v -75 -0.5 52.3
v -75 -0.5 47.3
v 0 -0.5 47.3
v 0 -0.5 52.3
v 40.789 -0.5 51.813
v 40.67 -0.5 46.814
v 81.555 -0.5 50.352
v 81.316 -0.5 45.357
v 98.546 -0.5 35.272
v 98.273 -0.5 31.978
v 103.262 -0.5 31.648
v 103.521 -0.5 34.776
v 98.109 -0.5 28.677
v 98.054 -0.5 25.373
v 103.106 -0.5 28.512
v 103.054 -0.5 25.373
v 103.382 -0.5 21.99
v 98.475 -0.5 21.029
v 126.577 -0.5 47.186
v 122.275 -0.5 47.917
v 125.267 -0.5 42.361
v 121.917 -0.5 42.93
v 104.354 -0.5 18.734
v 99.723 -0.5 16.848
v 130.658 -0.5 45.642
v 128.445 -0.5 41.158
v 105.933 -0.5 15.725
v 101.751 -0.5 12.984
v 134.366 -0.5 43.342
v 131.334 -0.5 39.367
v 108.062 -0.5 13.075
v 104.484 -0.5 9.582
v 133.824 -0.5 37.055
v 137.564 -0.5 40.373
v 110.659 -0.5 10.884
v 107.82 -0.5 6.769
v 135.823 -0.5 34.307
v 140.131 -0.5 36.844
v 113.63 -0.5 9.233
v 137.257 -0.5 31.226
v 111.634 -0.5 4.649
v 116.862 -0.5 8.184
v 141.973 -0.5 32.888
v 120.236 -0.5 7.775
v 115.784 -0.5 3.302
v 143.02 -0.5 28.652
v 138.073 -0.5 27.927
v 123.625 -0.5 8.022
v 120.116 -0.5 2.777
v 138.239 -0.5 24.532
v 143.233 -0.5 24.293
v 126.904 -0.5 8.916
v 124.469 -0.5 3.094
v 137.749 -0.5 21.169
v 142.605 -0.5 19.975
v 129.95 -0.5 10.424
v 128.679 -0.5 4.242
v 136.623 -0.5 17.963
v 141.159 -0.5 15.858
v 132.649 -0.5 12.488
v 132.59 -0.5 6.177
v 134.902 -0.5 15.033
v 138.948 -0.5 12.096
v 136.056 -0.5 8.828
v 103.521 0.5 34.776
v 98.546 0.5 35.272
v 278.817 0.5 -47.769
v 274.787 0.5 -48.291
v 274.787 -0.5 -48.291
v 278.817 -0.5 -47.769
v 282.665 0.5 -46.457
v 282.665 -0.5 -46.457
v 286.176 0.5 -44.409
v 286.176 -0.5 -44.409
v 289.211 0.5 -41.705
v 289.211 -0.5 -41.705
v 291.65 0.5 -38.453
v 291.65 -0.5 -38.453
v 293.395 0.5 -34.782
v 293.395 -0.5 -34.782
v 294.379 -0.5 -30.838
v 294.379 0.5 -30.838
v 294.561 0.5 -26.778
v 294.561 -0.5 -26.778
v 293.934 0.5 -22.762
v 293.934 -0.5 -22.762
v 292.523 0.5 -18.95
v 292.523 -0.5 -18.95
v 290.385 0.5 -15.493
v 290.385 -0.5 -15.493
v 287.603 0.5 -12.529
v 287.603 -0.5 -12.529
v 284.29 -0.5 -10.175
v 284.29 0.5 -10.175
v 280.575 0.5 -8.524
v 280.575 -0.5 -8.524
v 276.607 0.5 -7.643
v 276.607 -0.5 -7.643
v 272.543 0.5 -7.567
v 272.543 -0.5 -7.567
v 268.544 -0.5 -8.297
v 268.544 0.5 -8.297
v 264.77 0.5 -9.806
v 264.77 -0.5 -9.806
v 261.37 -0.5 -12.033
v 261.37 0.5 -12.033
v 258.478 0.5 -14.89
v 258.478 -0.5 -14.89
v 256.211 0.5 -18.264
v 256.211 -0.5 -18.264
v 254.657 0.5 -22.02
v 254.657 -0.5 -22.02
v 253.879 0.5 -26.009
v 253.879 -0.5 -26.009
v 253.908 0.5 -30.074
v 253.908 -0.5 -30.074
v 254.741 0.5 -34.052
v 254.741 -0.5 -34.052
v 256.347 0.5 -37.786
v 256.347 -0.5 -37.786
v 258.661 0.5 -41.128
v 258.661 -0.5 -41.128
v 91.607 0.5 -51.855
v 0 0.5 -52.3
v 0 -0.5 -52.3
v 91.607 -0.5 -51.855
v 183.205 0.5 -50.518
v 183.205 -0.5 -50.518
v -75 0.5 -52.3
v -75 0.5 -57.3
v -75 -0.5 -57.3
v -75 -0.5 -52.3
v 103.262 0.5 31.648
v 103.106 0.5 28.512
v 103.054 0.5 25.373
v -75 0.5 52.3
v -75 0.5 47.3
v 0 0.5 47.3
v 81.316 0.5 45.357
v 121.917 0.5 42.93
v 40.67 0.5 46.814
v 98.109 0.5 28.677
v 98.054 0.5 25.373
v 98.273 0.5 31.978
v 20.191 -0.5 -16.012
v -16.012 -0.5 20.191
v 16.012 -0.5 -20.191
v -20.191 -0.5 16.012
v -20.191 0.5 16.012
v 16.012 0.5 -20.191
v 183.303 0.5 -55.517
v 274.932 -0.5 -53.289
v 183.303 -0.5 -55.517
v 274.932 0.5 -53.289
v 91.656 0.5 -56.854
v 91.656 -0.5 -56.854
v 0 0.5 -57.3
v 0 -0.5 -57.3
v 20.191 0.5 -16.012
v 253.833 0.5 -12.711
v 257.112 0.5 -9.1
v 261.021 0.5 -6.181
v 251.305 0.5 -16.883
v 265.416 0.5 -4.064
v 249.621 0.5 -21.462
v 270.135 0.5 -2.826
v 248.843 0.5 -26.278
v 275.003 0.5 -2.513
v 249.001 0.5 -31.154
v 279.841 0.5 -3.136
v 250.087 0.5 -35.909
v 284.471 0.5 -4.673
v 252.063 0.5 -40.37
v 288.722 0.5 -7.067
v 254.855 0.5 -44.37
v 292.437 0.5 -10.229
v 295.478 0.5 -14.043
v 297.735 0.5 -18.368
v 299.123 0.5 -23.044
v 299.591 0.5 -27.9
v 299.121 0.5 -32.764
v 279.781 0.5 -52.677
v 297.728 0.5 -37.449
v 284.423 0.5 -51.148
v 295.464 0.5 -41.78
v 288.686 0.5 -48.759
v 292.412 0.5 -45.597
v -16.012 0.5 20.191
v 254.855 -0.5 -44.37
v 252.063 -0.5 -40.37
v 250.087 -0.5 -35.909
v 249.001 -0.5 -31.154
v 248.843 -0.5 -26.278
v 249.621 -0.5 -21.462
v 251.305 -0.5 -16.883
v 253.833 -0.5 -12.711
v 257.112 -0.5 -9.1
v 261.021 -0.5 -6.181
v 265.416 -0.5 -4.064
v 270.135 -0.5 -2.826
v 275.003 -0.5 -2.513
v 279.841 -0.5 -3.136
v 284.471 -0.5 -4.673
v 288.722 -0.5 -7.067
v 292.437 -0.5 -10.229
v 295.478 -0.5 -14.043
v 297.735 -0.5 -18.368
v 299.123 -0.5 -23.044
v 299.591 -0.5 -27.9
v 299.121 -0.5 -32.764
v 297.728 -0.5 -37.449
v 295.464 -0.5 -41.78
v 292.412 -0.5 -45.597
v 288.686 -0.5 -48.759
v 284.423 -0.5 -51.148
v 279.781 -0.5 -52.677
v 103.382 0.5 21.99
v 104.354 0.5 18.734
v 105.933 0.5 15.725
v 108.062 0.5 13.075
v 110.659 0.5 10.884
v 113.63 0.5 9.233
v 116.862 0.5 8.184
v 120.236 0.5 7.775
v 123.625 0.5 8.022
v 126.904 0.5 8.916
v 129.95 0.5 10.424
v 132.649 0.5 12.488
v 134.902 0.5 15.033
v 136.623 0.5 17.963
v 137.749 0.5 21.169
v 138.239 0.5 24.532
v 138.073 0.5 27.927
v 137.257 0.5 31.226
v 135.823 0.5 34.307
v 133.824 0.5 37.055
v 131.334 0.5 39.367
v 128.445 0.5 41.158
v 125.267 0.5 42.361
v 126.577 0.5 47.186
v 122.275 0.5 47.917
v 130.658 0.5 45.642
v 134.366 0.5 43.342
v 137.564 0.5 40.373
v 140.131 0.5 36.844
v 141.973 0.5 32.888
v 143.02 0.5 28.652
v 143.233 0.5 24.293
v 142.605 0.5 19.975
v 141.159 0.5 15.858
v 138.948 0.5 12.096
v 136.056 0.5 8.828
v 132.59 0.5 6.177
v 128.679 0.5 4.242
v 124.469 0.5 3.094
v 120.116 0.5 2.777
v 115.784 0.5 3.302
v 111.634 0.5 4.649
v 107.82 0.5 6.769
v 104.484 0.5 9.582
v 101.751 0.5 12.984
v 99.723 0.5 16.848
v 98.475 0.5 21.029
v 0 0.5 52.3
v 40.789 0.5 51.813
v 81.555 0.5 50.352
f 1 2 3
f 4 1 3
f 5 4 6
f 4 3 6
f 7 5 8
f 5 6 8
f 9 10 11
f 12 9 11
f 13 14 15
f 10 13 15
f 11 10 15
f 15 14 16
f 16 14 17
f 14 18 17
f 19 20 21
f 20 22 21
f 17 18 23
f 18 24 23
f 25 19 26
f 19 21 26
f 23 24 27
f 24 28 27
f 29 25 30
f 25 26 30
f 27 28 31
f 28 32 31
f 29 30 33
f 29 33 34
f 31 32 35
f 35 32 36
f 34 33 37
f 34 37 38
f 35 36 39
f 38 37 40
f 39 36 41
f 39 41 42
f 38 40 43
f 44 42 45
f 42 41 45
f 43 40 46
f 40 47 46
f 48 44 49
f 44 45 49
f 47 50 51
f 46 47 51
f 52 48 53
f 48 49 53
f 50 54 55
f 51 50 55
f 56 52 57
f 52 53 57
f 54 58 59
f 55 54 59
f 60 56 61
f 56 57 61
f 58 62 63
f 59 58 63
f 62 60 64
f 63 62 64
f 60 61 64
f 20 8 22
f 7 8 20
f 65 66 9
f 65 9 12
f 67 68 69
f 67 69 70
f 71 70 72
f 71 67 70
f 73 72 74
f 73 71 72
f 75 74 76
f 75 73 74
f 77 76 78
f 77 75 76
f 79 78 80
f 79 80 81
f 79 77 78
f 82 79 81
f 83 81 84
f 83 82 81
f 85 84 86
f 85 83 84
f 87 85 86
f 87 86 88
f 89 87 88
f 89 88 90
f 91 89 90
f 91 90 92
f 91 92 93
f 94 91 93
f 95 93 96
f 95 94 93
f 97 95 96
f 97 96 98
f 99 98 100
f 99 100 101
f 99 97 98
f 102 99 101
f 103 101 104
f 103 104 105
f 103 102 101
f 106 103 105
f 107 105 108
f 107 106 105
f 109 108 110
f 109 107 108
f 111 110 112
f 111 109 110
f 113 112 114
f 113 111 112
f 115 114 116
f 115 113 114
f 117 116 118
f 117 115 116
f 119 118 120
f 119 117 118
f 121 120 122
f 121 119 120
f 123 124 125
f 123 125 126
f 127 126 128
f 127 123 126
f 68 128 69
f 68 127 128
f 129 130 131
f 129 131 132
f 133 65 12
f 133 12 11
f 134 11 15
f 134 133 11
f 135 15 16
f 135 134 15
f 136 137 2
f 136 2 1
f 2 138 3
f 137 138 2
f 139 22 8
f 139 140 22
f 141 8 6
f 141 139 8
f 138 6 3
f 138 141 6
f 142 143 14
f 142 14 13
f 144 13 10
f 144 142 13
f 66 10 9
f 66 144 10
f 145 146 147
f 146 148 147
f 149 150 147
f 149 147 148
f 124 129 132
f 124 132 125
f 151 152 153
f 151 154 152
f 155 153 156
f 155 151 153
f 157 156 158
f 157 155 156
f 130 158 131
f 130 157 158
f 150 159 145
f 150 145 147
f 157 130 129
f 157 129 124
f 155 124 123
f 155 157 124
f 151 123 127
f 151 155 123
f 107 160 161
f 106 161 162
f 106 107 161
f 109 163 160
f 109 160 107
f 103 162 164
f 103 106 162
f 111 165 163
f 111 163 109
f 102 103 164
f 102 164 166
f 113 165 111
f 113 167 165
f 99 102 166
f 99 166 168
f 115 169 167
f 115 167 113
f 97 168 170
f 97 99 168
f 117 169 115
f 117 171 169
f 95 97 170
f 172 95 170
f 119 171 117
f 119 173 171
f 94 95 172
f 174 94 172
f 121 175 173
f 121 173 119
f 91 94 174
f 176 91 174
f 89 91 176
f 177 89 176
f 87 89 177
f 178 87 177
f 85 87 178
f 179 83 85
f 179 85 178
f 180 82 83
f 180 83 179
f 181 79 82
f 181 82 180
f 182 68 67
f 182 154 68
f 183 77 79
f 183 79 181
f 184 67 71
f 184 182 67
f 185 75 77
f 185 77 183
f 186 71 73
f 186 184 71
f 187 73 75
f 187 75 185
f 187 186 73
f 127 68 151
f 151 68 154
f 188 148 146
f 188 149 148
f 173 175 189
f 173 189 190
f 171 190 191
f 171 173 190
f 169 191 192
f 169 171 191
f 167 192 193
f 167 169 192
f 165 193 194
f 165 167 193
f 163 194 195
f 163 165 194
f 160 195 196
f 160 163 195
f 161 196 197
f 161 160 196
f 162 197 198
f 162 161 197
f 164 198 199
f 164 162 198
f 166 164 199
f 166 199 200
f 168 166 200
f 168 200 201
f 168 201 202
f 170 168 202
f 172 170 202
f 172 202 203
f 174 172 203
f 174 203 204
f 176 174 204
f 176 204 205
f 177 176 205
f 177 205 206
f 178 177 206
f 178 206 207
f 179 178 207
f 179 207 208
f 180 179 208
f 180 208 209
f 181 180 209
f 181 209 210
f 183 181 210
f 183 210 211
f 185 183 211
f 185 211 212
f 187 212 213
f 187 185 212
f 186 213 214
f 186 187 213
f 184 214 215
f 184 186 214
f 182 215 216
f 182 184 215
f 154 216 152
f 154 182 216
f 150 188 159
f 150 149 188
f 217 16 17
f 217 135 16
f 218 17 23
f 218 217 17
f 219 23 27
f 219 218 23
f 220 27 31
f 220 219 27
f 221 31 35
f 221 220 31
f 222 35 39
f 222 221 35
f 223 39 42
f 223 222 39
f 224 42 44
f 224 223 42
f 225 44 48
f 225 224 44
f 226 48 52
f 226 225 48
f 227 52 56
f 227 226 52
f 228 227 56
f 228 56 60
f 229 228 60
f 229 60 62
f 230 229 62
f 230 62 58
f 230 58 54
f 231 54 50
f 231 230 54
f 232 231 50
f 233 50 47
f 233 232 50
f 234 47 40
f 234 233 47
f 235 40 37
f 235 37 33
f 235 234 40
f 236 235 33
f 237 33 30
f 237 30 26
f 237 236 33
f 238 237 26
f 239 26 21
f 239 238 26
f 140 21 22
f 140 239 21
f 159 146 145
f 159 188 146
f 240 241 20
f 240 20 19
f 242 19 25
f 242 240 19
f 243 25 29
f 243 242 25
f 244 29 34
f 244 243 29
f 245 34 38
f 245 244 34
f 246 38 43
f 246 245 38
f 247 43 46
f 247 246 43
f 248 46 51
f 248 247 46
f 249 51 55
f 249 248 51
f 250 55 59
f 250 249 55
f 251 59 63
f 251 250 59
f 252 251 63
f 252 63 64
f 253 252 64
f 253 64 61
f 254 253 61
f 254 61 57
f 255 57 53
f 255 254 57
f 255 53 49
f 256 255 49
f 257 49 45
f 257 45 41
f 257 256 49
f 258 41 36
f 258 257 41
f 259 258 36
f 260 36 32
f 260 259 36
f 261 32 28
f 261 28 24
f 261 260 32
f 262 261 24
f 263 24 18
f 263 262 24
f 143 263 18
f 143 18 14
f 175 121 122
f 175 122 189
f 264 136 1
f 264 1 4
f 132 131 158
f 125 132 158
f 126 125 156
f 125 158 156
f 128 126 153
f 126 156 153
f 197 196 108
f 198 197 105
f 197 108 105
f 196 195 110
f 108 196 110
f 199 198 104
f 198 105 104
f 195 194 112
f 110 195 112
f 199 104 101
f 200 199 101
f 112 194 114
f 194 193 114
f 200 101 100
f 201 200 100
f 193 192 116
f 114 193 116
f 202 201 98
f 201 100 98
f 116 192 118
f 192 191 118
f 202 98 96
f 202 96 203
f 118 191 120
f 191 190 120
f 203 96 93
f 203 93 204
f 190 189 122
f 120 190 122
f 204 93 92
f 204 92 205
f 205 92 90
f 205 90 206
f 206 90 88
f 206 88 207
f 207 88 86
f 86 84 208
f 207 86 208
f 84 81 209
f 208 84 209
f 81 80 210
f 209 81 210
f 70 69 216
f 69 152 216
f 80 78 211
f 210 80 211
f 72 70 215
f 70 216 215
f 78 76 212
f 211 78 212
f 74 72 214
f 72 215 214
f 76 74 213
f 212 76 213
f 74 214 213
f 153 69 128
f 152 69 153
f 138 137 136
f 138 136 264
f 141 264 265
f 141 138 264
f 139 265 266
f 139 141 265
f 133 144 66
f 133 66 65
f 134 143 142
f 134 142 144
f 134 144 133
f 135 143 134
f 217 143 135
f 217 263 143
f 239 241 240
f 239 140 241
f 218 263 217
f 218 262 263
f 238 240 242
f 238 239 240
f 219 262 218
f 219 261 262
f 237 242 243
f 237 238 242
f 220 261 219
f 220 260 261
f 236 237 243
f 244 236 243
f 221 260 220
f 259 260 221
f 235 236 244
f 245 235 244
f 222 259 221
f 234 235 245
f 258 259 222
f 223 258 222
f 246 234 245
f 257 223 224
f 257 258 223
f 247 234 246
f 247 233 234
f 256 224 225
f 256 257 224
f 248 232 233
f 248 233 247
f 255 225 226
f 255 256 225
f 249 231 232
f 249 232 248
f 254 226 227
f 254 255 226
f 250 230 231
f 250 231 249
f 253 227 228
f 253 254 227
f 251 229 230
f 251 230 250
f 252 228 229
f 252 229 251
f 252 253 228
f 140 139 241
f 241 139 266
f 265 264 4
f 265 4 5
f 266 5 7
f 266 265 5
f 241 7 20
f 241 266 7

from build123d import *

# Parameters (mm, degrees)
BOSS_EXTRUDE1_DEPTH   = 0.5
BOSS_EXTRUDE1_2_DEPTH = 0.5
BOSS_EXTRUDE1_3_DEPTH = 0.5


with BuildPart() as part:
    # Sketch1 → Boss-Extrude1 (new, symmetric)
    with BuildSketch(Plane(origin=(0, 0, 0), x_dir=(1, 0, 0), z_dir=(0, 1, 0))):
        with BuildLine():
            Line((0, 57.3), (-75, 57.3))
            Line((-75, 57.3), (-75, 52.3))
            Line((-75, 52.3), (0, 52.3))
            ThreePointArc((0, 52.3), (137.407875272, 51.297776384), (274.786512082, 48.291318796))
            ThreePointArc((274.786512082, 48.291318796), (288.825291969, 42.113029408), (294.591434137, 27.9))
            ThreePointArc((294.591434137, 27.9), (267.143524545, 8.756150586), (258.661339001, 41.127854893))
            Line((258.661339001, 41.127854893), (254.854943134, 44.36997619))
            ThreePointArc((254.854943134, 44.36997619), (265.416095723, 4.064030632), (299.591434137, 27.9))
            ThreePointArc((299.591434137, 27.9), (292.412021829, 45.596615048), (274.932364519, 53.28919105))
            ThreePointArc((274.932364519, 53.28919105), (137.48080925, 56.297244419), (0, 57.3))
        make_face()
    extrude(amount=BOSS_EXTRUDE1_DEPTH, both=True)


with BuildPart() as body_2:
    # Sketch1 → Boss-Extrude1 2 (new, symmetric)
    with BuildSketch(Plane(origin=(0, 0, 0), x_dir=(1, 0, 0), z_dir=(0, 1, 0))):
        with BuildLine():
            Line((0, -47.3), (-75, -47.3))
            Line((-75, -47.3), (-75, -52.3))
            Line((-75, -52.3), (0, -52.3))
            ThreePointArc((0, -52.3), (61.176510654, -51.203966518), (122.274500718, -47.91727284))
            ThreePointArc((122.274500718, -47.91727284), (136.055904415, -8.828175809), (98.053793185, -25.372786309))
            ThreePointArc((98.053793185, -25.372786309), (98.17690041, -30.328625843), (98.545918412, -35.272240572))
            Line((98.545918412, -35.272240572), (103.521266149, -34.776342501))
            ThreePointArc((103.521266149, -34.776342501), (103.170733541, -30.080370616), (103.053793184, -25.372786309))
            ThreePointArc((103.053793184, -25.372786309), (132.64928349, -12.488084807), (121.916527169, -42.93010381))
            ThreePointArc((121.916527169, -42.93010381), (60.99740894, -46.20717529), (0, -47.3))
        make_face()
    extrude(amount=BOSS_EXTRUDE1_2_DEPTH, both=True)


with BuildPart() as body_3:
    # Sketch1 → Boss-Extrude1 3 (new, symmetric)
    with BuildSketch(Plane(origin=(0, 0, 0), x_dir=(1, 0, 0), z_dir=(0, 1, 0))):
        Polygon((-16.01243306, -20.191434137), (20.191434137, 16.01243306), (16.01243306, 20.191434137), (-20.191434137, -16.01243306), align=None)
    extrude(amount=BOSS_EXTRUDE1_3_DEPTH, both=True)


solid = Compound([part.part, body_2.part, body_3.part])
